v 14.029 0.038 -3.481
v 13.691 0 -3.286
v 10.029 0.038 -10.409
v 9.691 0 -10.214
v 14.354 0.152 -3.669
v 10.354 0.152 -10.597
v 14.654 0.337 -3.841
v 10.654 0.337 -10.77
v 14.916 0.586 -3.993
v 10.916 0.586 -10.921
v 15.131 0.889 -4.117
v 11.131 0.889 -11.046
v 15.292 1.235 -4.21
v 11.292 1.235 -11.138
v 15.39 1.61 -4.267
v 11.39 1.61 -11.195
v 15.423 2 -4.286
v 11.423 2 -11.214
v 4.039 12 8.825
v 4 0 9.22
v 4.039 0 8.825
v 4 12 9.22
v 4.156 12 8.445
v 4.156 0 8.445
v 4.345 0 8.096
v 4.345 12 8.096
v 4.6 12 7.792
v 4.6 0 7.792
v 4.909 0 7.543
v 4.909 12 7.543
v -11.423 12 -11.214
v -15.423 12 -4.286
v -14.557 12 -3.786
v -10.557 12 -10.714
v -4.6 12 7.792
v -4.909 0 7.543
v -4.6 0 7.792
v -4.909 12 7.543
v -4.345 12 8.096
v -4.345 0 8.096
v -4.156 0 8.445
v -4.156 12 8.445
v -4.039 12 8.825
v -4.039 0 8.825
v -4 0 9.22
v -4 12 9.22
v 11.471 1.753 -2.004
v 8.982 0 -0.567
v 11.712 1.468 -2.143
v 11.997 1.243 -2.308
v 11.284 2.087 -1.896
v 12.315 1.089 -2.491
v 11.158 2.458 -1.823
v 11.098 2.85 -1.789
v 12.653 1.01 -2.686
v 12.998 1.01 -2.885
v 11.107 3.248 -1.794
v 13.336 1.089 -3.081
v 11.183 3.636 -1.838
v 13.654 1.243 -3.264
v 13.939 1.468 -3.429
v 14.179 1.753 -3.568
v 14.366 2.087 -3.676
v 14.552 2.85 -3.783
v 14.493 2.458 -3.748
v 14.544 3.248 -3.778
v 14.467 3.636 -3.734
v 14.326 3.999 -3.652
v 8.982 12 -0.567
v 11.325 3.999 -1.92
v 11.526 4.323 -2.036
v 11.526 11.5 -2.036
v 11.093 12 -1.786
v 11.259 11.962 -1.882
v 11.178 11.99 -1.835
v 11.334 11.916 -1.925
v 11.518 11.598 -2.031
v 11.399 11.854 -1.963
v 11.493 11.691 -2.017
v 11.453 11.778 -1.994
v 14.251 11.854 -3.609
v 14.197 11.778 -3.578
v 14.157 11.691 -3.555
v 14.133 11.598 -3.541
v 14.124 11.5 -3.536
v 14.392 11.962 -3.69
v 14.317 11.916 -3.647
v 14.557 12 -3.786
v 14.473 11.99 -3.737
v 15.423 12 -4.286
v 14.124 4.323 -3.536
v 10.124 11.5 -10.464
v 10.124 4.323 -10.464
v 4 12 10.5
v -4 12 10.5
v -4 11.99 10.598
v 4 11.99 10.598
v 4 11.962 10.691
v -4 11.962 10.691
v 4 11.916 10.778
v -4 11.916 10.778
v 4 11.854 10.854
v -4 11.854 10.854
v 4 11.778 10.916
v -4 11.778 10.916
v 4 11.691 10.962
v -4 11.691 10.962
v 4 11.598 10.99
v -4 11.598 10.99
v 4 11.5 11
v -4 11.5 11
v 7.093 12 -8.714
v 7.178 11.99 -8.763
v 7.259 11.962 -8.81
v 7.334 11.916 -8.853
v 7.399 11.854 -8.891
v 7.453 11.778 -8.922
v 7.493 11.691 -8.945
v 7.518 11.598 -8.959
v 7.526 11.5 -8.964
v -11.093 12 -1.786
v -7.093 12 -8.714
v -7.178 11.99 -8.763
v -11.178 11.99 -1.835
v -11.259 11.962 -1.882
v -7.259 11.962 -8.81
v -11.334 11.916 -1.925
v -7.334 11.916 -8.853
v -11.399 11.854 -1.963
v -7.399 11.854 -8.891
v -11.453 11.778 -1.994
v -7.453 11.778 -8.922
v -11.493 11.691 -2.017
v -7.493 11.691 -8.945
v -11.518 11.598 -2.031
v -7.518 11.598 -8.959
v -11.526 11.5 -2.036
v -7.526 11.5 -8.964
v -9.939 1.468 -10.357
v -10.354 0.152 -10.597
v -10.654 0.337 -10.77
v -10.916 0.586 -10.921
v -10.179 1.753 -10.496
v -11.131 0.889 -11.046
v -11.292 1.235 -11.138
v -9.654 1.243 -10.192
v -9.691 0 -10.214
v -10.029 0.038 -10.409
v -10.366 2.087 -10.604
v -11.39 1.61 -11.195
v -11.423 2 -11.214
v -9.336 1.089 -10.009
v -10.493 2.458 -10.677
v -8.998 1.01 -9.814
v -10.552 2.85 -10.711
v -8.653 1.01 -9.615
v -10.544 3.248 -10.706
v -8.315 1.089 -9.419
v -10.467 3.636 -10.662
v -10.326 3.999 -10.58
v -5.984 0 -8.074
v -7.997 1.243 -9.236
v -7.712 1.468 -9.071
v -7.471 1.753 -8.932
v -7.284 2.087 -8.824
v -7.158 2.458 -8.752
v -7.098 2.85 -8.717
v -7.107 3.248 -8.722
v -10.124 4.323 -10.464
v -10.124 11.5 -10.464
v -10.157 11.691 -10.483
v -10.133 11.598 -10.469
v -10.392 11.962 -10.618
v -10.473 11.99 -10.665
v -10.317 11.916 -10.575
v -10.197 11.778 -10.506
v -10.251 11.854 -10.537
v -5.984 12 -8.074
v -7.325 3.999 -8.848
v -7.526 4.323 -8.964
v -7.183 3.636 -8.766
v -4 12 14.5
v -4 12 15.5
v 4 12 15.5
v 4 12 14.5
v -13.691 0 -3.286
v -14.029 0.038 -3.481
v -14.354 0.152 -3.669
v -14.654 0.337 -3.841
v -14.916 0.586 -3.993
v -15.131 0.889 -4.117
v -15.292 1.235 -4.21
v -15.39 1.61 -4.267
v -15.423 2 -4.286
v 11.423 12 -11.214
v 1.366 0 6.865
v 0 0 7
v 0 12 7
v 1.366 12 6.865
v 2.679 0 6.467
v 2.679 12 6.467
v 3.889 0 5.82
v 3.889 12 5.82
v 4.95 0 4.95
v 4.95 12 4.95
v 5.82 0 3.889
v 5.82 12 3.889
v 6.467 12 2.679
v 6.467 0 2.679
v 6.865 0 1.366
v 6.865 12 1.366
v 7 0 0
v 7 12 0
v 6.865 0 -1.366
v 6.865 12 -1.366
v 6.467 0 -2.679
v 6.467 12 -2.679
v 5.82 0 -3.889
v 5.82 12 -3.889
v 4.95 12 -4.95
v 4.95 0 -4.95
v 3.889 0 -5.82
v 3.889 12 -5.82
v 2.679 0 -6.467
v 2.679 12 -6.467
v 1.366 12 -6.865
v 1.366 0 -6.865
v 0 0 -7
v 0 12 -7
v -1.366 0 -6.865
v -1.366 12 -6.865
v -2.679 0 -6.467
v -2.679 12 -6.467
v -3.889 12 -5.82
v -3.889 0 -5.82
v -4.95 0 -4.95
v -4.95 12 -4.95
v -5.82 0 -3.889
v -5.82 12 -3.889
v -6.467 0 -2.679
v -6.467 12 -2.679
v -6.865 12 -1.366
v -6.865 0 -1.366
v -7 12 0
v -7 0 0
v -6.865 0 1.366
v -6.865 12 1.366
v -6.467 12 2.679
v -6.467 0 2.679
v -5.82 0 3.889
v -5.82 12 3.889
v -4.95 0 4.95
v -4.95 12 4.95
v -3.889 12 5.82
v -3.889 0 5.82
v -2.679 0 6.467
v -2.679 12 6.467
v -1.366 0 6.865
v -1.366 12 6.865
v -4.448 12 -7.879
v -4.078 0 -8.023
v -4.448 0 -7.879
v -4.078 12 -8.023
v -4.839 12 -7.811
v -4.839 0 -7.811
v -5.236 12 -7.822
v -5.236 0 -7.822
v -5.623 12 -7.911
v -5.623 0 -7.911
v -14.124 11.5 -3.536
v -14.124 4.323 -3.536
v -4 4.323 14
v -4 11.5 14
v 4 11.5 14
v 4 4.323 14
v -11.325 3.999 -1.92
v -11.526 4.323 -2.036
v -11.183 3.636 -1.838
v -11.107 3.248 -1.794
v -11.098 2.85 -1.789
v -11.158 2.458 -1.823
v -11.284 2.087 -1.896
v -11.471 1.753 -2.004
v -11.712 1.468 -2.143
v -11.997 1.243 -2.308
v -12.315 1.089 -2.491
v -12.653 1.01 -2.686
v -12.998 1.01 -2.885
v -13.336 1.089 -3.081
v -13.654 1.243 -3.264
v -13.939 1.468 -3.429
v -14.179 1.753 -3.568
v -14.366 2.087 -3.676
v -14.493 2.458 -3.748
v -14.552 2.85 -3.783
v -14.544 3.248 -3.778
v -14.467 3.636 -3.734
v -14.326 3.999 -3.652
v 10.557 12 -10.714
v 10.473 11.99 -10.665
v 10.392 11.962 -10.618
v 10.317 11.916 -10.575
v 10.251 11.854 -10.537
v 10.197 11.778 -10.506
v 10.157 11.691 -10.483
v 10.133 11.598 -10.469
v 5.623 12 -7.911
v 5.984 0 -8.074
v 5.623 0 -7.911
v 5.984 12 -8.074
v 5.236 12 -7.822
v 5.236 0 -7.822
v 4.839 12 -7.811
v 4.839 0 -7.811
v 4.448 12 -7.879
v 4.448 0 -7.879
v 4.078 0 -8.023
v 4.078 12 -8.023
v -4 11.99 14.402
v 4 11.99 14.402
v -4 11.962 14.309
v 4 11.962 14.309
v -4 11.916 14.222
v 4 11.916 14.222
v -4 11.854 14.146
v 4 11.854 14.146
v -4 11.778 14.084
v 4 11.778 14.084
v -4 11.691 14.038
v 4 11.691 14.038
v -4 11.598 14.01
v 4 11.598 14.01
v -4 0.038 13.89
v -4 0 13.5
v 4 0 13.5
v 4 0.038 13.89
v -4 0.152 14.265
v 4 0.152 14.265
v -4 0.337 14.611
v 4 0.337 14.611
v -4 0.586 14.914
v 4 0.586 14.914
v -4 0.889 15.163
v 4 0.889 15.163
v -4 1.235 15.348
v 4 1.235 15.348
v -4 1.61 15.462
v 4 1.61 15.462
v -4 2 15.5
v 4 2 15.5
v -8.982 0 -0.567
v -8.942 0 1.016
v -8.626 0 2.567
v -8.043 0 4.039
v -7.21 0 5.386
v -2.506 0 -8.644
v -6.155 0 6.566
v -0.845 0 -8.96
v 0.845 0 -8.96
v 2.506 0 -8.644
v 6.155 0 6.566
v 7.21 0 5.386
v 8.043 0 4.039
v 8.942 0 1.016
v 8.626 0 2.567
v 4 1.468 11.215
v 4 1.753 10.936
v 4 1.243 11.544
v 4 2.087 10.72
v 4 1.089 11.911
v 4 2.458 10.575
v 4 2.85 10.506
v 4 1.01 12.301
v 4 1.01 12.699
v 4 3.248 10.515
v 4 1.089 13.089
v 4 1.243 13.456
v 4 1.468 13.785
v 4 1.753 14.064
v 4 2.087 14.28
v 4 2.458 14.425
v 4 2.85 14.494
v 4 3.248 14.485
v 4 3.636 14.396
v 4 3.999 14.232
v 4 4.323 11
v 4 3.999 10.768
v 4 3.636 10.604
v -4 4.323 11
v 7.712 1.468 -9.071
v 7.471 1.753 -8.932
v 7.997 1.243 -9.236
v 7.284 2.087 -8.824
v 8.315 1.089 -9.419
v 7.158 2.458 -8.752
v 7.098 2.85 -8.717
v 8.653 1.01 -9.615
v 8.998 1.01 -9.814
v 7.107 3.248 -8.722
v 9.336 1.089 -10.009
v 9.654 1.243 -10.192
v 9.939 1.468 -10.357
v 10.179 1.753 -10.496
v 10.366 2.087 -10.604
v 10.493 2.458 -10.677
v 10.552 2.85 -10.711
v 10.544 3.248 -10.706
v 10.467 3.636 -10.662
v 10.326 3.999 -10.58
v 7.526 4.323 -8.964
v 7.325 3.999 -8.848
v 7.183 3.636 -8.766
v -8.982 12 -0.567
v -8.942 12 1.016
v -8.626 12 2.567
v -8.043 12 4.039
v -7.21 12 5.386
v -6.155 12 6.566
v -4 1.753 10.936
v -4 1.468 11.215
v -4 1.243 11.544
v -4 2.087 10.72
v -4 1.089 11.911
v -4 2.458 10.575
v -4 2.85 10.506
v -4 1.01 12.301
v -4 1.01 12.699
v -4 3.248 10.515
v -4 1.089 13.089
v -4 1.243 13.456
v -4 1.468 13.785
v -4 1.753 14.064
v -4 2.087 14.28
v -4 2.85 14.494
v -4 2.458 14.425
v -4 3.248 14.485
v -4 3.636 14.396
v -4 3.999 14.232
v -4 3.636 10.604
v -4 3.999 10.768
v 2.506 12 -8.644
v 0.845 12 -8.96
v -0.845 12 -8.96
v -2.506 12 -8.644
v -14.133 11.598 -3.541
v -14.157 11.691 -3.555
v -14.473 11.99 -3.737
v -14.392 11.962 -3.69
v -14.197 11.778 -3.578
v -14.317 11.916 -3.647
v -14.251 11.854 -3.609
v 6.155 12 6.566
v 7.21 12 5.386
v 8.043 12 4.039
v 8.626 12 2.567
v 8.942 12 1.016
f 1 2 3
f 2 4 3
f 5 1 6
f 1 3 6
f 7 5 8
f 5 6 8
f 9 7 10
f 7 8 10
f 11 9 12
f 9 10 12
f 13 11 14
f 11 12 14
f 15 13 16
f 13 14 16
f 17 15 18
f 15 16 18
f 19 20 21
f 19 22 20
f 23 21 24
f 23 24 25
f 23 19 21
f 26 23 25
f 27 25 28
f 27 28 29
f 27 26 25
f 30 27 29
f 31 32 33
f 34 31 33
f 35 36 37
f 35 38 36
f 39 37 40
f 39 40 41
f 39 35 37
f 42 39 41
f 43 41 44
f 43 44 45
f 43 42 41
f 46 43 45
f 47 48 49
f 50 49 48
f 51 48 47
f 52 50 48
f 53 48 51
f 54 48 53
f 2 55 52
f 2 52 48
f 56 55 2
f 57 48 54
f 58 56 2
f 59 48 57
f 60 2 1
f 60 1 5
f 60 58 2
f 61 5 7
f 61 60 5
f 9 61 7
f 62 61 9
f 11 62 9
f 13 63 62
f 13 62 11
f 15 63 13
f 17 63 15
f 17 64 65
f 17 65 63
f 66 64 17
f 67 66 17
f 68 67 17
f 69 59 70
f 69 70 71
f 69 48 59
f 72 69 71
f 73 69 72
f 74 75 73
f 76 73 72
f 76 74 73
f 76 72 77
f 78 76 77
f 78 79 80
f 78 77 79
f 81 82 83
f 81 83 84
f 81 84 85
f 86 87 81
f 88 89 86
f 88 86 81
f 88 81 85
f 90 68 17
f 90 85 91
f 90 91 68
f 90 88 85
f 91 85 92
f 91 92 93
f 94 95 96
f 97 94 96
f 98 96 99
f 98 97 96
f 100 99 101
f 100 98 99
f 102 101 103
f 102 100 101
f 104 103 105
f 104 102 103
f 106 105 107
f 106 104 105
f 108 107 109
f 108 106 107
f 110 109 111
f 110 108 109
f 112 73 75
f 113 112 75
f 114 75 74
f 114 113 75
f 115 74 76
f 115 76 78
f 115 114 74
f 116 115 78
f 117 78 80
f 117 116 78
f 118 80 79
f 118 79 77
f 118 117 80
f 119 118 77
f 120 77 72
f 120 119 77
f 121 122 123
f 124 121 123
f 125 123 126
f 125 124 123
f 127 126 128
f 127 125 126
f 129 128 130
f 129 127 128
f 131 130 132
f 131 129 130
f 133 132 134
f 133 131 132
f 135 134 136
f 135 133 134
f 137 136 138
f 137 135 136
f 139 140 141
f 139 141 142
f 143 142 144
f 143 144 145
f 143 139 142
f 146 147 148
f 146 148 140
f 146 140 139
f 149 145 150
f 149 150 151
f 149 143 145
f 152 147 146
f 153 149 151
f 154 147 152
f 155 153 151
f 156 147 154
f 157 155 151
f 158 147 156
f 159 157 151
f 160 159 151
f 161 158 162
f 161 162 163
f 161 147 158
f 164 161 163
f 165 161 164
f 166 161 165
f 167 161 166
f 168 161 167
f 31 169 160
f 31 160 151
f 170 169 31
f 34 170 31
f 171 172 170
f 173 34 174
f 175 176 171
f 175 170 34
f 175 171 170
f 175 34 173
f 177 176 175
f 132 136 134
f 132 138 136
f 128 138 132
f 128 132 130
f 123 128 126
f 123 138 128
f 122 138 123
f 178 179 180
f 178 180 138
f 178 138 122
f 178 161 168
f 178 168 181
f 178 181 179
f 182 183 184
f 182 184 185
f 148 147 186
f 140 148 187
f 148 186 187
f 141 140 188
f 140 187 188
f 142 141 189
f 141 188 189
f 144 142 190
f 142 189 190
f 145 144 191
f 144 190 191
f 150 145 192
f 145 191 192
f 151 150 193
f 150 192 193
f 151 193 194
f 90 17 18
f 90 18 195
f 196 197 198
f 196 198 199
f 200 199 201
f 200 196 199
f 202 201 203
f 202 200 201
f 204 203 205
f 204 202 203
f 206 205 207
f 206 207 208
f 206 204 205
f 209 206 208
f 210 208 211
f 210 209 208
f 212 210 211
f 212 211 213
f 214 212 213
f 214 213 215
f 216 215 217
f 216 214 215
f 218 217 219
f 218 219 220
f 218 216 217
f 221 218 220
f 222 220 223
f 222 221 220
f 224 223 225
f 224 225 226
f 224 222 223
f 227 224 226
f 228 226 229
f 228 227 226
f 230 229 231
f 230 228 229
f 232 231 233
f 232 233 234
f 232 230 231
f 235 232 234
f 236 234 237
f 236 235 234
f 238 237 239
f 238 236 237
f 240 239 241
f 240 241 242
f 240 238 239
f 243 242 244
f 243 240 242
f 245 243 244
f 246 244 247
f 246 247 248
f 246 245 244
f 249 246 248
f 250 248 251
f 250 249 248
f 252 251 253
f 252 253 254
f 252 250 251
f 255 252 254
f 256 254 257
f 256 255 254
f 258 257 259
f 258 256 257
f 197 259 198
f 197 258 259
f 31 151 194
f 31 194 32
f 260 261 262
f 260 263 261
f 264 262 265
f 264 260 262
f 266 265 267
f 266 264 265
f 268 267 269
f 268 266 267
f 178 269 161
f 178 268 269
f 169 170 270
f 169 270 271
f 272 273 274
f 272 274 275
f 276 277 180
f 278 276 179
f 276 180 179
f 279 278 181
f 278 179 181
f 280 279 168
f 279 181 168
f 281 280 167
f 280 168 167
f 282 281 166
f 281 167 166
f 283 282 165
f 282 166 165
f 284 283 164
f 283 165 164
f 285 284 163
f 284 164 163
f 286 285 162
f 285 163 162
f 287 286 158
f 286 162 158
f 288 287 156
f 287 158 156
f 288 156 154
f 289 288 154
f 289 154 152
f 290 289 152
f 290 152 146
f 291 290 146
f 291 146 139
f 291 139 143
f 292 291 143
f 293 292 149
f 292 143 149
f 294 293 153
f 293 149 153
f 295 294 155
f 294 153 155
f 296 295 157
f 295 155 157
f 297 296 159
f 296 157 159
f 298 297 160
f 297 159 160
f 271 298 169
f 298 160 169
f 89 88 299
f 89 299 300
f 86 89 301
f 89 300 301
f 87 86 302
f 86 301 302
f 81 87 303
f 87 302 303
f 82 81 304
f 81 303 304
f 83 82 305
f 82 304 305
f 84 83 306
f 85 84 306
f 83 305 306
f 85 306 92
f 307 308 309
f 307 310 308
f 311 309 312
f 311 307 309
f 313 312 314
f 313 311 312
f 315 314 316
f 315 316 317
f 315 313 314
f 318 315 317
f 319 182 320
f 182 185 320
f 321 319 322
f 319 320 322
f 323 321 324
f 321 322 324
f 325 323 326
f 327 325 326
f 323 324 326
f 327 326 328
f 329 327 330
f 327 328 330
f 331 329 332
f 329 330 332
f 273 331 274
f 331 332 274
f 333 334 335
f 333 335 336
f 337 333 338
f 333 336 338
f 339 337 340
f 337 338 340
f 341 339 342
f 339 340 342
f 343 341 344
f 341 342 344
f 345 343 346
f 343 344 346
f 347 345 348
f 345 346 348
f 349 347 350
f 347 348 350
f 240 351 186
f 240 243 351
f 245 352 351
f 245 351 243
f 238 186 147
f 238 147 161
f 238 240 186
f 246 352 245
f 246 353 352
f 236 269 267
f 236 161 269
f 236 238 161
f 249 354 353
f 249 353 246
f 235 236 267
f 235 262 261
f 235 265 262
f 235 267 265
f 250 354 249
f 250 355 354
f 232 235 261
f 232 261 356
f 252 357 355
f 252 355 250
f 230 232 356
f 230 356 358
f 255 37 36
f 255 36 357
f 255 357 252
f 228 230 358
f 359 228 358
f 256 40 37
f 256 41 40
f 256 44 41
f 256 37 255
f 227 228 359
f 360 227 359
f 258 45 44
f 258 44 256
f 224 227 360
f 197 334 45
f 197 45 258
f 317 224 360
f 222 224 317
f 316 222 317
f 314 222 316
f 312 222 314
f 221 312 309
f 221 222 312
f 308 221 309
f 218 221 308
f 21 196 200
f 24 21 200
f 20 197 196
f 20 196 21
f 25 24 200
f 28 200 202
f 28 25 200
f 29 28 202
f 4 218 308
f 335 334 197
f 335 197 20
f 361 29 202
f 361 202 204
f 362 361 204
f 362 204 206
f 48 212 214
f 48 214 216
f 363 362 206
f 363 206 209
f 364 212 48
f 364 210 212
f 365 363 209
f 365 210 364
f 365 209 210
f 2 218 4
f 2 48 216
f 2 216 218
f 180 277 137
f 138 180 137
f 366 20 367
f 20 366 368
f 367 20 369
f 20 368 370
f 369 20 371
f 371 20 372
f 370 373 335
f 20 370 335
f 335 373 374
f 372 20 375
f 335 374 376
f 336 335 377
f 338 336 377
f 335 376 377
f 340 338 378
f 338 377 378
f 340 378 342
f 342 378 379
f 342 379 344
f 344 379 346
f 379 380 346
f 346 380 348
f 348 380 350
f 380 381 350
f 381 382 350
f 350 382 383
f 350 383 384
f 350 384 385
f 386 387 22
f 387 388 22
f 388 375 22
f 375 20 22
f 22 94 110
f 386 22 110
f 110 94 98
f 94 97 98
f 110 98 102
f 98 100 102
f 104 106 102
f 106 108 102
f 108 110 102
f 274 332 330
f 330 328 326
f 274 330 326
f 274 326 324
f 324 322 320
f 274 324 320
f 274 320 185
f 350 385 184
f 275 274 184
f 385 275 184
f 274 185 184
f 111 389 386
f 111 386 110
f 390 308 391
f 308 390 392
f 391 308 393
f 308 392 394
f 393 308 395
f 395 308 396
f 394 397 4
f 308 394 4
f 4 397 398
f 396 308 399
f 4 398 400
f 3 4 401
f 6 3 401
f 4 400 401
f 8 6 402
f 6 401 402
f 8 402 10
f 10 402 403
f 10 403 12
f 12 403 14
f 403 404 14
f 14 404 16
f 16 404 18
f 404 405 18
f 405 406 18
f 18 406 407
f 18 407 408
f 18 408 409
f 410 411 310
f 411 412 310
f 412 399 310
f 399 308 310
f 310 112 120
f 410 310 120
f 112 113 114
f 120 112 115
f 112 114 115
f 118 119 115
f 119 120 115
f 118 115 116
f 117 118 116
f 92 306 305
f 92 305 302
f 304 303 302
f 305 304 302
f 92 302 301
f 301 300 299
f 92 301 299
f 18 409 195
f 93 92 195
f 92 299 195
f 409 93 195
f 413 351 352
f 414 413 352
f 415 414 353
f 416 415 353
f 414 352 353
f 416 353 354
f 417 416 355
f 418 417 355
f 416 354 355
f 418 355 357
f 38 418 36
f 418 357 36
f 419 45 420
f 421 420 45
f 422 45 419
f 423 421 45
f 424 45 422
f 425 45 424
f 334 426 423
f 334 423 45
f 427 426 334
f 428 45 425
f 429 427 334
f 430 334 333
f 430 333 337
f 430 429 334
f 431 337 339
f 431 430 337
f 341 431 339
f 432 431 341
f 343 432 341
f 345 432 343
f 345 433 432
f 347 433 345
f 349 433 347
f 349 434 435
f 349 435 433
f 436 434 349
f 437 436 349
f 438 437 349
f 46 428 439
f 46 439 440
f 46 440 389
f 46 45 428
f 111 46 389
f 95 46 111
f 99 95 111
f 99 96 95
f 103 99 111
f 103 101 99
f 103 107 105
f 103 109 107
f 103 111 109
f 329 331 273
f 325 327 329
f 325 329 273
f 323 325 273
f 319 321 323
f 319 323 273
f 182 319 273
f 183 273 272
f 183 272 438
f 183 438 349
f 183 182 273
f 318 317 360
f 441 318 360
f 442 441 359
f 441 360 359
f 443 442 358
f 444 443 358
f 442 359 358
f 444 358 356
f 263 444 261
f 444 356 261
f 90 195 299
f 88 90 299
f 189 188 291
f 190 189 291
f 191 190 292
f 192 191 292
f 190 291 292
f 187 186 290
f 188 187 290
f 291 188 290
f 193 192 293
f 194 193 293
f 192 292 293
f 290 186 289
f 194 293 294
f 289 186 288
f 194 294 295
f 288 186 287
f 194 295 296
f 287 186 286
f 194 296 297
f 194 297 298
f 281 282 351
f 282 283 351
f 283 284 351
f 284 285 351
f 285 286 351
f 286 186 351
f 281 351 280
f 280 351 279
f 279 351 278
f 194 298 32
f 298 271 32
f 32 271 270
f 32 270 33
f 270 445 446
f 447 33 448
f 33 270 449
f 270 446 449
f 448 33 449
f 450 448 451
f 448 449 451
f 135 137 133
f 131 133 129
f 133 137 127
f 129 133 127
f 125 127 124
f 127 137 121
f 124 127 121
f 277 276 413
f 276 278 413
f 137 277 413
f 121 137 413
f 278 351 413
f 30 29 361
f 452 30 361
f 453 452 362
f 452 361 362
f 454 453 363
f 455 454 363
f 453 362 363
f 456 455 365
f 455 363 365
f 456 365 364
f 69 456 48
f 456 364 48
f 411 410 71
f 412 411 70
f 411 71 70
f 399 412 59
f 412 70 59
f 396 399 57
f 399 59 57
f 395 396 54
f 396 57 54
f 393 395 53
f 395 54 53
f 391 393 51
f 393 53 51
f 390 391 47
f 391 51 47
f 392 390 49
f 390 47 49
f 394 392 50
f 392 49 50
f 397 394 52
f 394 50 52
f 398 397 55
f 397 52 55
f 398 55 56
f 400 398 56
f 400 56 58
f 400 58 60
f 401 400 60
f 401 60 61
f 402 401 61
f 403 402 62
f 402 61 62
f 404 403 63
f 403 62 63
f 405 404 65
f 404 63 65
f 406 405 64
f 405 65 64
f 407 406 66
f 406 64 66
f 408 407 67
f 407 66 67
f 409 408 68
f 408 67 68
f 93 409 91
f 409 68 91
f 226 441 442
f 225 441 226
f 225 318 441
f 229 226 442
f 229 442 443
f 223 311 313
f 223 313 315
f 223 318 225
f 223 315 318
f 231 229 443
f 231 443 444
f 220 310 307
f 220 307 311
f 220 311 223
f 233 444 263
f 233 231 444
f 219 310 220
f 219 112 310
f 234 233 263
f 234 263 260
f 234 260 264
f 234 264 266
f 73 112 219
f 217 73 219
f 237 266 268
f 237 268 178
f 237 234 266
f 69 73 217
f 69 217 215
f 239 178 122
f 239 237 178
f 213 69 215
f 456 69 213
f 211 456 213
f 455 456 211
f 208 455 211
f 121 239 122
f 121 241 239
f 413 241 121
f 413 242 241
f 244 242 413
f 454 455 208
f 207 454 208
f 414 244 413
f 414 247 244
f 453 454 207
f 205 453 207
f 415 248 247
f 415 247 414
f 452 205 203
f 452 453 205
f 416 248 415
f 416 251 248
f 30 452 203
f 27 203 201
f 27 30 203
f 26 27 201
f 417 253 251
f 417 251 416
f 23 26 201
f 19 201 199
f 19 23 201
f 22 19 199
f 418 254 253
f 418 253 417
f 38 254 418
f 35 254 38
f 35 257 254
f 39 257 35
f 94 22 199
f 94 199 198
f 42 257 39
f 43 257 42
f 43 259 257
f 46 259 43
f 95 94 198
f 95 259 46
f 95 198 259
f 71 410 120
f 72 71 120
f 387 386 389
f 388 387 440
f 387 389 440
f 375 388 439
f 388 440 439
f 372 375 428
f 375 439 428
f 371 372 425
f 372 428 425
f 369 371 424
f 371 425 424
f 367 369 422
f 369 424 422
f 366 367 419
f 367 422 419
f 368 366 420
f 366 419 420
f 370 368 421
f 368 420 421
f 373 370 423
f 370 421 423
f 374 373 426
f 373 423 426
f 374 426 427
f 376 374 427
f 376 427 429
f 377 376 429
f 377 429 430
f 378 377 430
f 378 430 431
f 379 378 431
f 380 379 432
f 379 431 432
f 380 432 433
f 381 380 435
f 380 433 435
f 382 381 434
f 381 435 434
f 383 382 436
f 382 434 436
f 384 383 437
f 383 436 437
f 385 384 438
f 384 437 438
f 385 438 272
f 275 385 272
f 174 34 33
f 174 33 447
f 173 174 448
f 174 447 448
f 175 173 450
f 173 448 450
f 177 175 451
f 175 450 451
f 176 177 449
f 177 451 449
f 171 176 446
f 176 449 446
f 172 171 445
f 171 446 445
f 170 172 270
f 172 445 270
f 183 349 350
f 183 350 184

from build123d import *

# Parameters (mm, degrees)
SKETCH1_R           = 9
SKETCH1_R_2         = 7
BOSS_EXTRUDE1_DEPTH = 12
BOSS_EXTRUDE2_START = -0.937742
SKETCH2_W           = 8
SKETCH2_H           = 12
BOSS_EXTRUDE2_DEPTH = 1.437742
BOSS_EXTRUDE3_DEPTH = 8
SKETCH4_R           = 2
CUT_EXTRUDE1_DEPTH  = 11
CIRPATTERN1_COUNT   = 3
FILLET1_R           = 2
FILLET2_R           = 0.5


with BuildPart() as part:
    # Sketch1 → Boss-Extrude1 (new body)
    with BuildSketch(Plane(origin=(0, 0, 0), x_dir=(1, 0, 0), z_dir=(0, 1, 0))):
        with Locations(Location((0, 0, 0), (0, 0, 270))):
            Circle(SKETCH1_R)
        with Locations(Location((0, 0, 0), (0, 0, 270))):
            Circle(SKETCH1_R_2, mode=Mode.SUBTRACT)
    extrude(amount=BOSS_EXTRUDE1_DEPTH)

    # Sketch2 → Boss-Extrude2 (add)
    with BuildSketch(Plane.XY.offset(9).offset(BOSS_EXTRUDE2_START)):
        with Locations((0, 6)):
            Rectangle(SKETCH2_W, SKETCH2_H)
    boss_extrude2 = extrude(amount=BOSS_EXTRUDE2_DEPTH)

    # Sketch3 → Boss-Extrude3 (add)
    with BuildSketch(Plane.ZY.offset(4)):
        Polygon((9.5, 0), (12.5, 0), (15.5, 0), (15.5, 12), (14, 12), (14, 3), (11, 3), (11, 12), (9.5, 12), align=None)
    boss_extrude3 = extrude(amount=-BOSS_EXTRUDE3_DEPTH)

    # Sketch4 → Cut-Extrude1 (cut)
    with BuildSketch(Plane.ZY.offset(4)):
        with Locations((12.5, 3)):
            Circle(SKETCH4_R)
    cut_extrude1 = extrude(amount=-CUT_EXTRUDE1_DEPTH, mode=Mode.SUBTRACT)

    # CirPattern1: Boss-Extrude2, Boss-Extrude3, Cut-Extrude1 ×3 about axis
    cirpattern1_axis = Axis((0, 0, 0), (0, 1, 0))
    add([boss_extrude2.rotate(cirpattern1_axis, i * 360 / CIRPATTERN1_COUNT) for i in range(1, CIRPATTERN1_COUNT)])
    add([boss_extrude3.rotate(cirpattern1_axis, i * 360 / CIRPATTERN1_COUNT) for i in range(1, CIRPATTERN1_COUNT)])
    add([cut_extrude1.rotate(cirpattern1_axis, i * 360 / CIRPATTERN1_COUNT) for i in range(1, CIRPATTERN1_COUNT)], mode=Mode.SUBTRACT)

    # Fillet1
    fillet1_edges = [part.edges().sort_by_distance(p)[0] for p in [
        (-13.423393759, 0, -7.75),
        (4, 6, 8.062258),
        (-4, 6, 8.062258),
        (0, 0, 15.5),
        (4.98212024, 6, -7.495230615),
        (-4.98212024, 6, -7.495230615),
        (13.423393759, 0, -7.75),
    ]]
    fillet(fillet1_edges, radius=FILLET1_R)

    # Fillet2
    fillet2_edges = [part.edges().sort_by_distance(p)[0] for p in [
        (-12.124355653, 12, -7),
        (0, 12, 11),
        (0, 12, 14),
        (9.526279442, 12, -5.5),
        (12.124355653, 12, -7),
        (-9.526279442, 12, -5.5),
    ]]
    fillet(fillet2_edges, radius=FILLET2_R)


solid = part.part
